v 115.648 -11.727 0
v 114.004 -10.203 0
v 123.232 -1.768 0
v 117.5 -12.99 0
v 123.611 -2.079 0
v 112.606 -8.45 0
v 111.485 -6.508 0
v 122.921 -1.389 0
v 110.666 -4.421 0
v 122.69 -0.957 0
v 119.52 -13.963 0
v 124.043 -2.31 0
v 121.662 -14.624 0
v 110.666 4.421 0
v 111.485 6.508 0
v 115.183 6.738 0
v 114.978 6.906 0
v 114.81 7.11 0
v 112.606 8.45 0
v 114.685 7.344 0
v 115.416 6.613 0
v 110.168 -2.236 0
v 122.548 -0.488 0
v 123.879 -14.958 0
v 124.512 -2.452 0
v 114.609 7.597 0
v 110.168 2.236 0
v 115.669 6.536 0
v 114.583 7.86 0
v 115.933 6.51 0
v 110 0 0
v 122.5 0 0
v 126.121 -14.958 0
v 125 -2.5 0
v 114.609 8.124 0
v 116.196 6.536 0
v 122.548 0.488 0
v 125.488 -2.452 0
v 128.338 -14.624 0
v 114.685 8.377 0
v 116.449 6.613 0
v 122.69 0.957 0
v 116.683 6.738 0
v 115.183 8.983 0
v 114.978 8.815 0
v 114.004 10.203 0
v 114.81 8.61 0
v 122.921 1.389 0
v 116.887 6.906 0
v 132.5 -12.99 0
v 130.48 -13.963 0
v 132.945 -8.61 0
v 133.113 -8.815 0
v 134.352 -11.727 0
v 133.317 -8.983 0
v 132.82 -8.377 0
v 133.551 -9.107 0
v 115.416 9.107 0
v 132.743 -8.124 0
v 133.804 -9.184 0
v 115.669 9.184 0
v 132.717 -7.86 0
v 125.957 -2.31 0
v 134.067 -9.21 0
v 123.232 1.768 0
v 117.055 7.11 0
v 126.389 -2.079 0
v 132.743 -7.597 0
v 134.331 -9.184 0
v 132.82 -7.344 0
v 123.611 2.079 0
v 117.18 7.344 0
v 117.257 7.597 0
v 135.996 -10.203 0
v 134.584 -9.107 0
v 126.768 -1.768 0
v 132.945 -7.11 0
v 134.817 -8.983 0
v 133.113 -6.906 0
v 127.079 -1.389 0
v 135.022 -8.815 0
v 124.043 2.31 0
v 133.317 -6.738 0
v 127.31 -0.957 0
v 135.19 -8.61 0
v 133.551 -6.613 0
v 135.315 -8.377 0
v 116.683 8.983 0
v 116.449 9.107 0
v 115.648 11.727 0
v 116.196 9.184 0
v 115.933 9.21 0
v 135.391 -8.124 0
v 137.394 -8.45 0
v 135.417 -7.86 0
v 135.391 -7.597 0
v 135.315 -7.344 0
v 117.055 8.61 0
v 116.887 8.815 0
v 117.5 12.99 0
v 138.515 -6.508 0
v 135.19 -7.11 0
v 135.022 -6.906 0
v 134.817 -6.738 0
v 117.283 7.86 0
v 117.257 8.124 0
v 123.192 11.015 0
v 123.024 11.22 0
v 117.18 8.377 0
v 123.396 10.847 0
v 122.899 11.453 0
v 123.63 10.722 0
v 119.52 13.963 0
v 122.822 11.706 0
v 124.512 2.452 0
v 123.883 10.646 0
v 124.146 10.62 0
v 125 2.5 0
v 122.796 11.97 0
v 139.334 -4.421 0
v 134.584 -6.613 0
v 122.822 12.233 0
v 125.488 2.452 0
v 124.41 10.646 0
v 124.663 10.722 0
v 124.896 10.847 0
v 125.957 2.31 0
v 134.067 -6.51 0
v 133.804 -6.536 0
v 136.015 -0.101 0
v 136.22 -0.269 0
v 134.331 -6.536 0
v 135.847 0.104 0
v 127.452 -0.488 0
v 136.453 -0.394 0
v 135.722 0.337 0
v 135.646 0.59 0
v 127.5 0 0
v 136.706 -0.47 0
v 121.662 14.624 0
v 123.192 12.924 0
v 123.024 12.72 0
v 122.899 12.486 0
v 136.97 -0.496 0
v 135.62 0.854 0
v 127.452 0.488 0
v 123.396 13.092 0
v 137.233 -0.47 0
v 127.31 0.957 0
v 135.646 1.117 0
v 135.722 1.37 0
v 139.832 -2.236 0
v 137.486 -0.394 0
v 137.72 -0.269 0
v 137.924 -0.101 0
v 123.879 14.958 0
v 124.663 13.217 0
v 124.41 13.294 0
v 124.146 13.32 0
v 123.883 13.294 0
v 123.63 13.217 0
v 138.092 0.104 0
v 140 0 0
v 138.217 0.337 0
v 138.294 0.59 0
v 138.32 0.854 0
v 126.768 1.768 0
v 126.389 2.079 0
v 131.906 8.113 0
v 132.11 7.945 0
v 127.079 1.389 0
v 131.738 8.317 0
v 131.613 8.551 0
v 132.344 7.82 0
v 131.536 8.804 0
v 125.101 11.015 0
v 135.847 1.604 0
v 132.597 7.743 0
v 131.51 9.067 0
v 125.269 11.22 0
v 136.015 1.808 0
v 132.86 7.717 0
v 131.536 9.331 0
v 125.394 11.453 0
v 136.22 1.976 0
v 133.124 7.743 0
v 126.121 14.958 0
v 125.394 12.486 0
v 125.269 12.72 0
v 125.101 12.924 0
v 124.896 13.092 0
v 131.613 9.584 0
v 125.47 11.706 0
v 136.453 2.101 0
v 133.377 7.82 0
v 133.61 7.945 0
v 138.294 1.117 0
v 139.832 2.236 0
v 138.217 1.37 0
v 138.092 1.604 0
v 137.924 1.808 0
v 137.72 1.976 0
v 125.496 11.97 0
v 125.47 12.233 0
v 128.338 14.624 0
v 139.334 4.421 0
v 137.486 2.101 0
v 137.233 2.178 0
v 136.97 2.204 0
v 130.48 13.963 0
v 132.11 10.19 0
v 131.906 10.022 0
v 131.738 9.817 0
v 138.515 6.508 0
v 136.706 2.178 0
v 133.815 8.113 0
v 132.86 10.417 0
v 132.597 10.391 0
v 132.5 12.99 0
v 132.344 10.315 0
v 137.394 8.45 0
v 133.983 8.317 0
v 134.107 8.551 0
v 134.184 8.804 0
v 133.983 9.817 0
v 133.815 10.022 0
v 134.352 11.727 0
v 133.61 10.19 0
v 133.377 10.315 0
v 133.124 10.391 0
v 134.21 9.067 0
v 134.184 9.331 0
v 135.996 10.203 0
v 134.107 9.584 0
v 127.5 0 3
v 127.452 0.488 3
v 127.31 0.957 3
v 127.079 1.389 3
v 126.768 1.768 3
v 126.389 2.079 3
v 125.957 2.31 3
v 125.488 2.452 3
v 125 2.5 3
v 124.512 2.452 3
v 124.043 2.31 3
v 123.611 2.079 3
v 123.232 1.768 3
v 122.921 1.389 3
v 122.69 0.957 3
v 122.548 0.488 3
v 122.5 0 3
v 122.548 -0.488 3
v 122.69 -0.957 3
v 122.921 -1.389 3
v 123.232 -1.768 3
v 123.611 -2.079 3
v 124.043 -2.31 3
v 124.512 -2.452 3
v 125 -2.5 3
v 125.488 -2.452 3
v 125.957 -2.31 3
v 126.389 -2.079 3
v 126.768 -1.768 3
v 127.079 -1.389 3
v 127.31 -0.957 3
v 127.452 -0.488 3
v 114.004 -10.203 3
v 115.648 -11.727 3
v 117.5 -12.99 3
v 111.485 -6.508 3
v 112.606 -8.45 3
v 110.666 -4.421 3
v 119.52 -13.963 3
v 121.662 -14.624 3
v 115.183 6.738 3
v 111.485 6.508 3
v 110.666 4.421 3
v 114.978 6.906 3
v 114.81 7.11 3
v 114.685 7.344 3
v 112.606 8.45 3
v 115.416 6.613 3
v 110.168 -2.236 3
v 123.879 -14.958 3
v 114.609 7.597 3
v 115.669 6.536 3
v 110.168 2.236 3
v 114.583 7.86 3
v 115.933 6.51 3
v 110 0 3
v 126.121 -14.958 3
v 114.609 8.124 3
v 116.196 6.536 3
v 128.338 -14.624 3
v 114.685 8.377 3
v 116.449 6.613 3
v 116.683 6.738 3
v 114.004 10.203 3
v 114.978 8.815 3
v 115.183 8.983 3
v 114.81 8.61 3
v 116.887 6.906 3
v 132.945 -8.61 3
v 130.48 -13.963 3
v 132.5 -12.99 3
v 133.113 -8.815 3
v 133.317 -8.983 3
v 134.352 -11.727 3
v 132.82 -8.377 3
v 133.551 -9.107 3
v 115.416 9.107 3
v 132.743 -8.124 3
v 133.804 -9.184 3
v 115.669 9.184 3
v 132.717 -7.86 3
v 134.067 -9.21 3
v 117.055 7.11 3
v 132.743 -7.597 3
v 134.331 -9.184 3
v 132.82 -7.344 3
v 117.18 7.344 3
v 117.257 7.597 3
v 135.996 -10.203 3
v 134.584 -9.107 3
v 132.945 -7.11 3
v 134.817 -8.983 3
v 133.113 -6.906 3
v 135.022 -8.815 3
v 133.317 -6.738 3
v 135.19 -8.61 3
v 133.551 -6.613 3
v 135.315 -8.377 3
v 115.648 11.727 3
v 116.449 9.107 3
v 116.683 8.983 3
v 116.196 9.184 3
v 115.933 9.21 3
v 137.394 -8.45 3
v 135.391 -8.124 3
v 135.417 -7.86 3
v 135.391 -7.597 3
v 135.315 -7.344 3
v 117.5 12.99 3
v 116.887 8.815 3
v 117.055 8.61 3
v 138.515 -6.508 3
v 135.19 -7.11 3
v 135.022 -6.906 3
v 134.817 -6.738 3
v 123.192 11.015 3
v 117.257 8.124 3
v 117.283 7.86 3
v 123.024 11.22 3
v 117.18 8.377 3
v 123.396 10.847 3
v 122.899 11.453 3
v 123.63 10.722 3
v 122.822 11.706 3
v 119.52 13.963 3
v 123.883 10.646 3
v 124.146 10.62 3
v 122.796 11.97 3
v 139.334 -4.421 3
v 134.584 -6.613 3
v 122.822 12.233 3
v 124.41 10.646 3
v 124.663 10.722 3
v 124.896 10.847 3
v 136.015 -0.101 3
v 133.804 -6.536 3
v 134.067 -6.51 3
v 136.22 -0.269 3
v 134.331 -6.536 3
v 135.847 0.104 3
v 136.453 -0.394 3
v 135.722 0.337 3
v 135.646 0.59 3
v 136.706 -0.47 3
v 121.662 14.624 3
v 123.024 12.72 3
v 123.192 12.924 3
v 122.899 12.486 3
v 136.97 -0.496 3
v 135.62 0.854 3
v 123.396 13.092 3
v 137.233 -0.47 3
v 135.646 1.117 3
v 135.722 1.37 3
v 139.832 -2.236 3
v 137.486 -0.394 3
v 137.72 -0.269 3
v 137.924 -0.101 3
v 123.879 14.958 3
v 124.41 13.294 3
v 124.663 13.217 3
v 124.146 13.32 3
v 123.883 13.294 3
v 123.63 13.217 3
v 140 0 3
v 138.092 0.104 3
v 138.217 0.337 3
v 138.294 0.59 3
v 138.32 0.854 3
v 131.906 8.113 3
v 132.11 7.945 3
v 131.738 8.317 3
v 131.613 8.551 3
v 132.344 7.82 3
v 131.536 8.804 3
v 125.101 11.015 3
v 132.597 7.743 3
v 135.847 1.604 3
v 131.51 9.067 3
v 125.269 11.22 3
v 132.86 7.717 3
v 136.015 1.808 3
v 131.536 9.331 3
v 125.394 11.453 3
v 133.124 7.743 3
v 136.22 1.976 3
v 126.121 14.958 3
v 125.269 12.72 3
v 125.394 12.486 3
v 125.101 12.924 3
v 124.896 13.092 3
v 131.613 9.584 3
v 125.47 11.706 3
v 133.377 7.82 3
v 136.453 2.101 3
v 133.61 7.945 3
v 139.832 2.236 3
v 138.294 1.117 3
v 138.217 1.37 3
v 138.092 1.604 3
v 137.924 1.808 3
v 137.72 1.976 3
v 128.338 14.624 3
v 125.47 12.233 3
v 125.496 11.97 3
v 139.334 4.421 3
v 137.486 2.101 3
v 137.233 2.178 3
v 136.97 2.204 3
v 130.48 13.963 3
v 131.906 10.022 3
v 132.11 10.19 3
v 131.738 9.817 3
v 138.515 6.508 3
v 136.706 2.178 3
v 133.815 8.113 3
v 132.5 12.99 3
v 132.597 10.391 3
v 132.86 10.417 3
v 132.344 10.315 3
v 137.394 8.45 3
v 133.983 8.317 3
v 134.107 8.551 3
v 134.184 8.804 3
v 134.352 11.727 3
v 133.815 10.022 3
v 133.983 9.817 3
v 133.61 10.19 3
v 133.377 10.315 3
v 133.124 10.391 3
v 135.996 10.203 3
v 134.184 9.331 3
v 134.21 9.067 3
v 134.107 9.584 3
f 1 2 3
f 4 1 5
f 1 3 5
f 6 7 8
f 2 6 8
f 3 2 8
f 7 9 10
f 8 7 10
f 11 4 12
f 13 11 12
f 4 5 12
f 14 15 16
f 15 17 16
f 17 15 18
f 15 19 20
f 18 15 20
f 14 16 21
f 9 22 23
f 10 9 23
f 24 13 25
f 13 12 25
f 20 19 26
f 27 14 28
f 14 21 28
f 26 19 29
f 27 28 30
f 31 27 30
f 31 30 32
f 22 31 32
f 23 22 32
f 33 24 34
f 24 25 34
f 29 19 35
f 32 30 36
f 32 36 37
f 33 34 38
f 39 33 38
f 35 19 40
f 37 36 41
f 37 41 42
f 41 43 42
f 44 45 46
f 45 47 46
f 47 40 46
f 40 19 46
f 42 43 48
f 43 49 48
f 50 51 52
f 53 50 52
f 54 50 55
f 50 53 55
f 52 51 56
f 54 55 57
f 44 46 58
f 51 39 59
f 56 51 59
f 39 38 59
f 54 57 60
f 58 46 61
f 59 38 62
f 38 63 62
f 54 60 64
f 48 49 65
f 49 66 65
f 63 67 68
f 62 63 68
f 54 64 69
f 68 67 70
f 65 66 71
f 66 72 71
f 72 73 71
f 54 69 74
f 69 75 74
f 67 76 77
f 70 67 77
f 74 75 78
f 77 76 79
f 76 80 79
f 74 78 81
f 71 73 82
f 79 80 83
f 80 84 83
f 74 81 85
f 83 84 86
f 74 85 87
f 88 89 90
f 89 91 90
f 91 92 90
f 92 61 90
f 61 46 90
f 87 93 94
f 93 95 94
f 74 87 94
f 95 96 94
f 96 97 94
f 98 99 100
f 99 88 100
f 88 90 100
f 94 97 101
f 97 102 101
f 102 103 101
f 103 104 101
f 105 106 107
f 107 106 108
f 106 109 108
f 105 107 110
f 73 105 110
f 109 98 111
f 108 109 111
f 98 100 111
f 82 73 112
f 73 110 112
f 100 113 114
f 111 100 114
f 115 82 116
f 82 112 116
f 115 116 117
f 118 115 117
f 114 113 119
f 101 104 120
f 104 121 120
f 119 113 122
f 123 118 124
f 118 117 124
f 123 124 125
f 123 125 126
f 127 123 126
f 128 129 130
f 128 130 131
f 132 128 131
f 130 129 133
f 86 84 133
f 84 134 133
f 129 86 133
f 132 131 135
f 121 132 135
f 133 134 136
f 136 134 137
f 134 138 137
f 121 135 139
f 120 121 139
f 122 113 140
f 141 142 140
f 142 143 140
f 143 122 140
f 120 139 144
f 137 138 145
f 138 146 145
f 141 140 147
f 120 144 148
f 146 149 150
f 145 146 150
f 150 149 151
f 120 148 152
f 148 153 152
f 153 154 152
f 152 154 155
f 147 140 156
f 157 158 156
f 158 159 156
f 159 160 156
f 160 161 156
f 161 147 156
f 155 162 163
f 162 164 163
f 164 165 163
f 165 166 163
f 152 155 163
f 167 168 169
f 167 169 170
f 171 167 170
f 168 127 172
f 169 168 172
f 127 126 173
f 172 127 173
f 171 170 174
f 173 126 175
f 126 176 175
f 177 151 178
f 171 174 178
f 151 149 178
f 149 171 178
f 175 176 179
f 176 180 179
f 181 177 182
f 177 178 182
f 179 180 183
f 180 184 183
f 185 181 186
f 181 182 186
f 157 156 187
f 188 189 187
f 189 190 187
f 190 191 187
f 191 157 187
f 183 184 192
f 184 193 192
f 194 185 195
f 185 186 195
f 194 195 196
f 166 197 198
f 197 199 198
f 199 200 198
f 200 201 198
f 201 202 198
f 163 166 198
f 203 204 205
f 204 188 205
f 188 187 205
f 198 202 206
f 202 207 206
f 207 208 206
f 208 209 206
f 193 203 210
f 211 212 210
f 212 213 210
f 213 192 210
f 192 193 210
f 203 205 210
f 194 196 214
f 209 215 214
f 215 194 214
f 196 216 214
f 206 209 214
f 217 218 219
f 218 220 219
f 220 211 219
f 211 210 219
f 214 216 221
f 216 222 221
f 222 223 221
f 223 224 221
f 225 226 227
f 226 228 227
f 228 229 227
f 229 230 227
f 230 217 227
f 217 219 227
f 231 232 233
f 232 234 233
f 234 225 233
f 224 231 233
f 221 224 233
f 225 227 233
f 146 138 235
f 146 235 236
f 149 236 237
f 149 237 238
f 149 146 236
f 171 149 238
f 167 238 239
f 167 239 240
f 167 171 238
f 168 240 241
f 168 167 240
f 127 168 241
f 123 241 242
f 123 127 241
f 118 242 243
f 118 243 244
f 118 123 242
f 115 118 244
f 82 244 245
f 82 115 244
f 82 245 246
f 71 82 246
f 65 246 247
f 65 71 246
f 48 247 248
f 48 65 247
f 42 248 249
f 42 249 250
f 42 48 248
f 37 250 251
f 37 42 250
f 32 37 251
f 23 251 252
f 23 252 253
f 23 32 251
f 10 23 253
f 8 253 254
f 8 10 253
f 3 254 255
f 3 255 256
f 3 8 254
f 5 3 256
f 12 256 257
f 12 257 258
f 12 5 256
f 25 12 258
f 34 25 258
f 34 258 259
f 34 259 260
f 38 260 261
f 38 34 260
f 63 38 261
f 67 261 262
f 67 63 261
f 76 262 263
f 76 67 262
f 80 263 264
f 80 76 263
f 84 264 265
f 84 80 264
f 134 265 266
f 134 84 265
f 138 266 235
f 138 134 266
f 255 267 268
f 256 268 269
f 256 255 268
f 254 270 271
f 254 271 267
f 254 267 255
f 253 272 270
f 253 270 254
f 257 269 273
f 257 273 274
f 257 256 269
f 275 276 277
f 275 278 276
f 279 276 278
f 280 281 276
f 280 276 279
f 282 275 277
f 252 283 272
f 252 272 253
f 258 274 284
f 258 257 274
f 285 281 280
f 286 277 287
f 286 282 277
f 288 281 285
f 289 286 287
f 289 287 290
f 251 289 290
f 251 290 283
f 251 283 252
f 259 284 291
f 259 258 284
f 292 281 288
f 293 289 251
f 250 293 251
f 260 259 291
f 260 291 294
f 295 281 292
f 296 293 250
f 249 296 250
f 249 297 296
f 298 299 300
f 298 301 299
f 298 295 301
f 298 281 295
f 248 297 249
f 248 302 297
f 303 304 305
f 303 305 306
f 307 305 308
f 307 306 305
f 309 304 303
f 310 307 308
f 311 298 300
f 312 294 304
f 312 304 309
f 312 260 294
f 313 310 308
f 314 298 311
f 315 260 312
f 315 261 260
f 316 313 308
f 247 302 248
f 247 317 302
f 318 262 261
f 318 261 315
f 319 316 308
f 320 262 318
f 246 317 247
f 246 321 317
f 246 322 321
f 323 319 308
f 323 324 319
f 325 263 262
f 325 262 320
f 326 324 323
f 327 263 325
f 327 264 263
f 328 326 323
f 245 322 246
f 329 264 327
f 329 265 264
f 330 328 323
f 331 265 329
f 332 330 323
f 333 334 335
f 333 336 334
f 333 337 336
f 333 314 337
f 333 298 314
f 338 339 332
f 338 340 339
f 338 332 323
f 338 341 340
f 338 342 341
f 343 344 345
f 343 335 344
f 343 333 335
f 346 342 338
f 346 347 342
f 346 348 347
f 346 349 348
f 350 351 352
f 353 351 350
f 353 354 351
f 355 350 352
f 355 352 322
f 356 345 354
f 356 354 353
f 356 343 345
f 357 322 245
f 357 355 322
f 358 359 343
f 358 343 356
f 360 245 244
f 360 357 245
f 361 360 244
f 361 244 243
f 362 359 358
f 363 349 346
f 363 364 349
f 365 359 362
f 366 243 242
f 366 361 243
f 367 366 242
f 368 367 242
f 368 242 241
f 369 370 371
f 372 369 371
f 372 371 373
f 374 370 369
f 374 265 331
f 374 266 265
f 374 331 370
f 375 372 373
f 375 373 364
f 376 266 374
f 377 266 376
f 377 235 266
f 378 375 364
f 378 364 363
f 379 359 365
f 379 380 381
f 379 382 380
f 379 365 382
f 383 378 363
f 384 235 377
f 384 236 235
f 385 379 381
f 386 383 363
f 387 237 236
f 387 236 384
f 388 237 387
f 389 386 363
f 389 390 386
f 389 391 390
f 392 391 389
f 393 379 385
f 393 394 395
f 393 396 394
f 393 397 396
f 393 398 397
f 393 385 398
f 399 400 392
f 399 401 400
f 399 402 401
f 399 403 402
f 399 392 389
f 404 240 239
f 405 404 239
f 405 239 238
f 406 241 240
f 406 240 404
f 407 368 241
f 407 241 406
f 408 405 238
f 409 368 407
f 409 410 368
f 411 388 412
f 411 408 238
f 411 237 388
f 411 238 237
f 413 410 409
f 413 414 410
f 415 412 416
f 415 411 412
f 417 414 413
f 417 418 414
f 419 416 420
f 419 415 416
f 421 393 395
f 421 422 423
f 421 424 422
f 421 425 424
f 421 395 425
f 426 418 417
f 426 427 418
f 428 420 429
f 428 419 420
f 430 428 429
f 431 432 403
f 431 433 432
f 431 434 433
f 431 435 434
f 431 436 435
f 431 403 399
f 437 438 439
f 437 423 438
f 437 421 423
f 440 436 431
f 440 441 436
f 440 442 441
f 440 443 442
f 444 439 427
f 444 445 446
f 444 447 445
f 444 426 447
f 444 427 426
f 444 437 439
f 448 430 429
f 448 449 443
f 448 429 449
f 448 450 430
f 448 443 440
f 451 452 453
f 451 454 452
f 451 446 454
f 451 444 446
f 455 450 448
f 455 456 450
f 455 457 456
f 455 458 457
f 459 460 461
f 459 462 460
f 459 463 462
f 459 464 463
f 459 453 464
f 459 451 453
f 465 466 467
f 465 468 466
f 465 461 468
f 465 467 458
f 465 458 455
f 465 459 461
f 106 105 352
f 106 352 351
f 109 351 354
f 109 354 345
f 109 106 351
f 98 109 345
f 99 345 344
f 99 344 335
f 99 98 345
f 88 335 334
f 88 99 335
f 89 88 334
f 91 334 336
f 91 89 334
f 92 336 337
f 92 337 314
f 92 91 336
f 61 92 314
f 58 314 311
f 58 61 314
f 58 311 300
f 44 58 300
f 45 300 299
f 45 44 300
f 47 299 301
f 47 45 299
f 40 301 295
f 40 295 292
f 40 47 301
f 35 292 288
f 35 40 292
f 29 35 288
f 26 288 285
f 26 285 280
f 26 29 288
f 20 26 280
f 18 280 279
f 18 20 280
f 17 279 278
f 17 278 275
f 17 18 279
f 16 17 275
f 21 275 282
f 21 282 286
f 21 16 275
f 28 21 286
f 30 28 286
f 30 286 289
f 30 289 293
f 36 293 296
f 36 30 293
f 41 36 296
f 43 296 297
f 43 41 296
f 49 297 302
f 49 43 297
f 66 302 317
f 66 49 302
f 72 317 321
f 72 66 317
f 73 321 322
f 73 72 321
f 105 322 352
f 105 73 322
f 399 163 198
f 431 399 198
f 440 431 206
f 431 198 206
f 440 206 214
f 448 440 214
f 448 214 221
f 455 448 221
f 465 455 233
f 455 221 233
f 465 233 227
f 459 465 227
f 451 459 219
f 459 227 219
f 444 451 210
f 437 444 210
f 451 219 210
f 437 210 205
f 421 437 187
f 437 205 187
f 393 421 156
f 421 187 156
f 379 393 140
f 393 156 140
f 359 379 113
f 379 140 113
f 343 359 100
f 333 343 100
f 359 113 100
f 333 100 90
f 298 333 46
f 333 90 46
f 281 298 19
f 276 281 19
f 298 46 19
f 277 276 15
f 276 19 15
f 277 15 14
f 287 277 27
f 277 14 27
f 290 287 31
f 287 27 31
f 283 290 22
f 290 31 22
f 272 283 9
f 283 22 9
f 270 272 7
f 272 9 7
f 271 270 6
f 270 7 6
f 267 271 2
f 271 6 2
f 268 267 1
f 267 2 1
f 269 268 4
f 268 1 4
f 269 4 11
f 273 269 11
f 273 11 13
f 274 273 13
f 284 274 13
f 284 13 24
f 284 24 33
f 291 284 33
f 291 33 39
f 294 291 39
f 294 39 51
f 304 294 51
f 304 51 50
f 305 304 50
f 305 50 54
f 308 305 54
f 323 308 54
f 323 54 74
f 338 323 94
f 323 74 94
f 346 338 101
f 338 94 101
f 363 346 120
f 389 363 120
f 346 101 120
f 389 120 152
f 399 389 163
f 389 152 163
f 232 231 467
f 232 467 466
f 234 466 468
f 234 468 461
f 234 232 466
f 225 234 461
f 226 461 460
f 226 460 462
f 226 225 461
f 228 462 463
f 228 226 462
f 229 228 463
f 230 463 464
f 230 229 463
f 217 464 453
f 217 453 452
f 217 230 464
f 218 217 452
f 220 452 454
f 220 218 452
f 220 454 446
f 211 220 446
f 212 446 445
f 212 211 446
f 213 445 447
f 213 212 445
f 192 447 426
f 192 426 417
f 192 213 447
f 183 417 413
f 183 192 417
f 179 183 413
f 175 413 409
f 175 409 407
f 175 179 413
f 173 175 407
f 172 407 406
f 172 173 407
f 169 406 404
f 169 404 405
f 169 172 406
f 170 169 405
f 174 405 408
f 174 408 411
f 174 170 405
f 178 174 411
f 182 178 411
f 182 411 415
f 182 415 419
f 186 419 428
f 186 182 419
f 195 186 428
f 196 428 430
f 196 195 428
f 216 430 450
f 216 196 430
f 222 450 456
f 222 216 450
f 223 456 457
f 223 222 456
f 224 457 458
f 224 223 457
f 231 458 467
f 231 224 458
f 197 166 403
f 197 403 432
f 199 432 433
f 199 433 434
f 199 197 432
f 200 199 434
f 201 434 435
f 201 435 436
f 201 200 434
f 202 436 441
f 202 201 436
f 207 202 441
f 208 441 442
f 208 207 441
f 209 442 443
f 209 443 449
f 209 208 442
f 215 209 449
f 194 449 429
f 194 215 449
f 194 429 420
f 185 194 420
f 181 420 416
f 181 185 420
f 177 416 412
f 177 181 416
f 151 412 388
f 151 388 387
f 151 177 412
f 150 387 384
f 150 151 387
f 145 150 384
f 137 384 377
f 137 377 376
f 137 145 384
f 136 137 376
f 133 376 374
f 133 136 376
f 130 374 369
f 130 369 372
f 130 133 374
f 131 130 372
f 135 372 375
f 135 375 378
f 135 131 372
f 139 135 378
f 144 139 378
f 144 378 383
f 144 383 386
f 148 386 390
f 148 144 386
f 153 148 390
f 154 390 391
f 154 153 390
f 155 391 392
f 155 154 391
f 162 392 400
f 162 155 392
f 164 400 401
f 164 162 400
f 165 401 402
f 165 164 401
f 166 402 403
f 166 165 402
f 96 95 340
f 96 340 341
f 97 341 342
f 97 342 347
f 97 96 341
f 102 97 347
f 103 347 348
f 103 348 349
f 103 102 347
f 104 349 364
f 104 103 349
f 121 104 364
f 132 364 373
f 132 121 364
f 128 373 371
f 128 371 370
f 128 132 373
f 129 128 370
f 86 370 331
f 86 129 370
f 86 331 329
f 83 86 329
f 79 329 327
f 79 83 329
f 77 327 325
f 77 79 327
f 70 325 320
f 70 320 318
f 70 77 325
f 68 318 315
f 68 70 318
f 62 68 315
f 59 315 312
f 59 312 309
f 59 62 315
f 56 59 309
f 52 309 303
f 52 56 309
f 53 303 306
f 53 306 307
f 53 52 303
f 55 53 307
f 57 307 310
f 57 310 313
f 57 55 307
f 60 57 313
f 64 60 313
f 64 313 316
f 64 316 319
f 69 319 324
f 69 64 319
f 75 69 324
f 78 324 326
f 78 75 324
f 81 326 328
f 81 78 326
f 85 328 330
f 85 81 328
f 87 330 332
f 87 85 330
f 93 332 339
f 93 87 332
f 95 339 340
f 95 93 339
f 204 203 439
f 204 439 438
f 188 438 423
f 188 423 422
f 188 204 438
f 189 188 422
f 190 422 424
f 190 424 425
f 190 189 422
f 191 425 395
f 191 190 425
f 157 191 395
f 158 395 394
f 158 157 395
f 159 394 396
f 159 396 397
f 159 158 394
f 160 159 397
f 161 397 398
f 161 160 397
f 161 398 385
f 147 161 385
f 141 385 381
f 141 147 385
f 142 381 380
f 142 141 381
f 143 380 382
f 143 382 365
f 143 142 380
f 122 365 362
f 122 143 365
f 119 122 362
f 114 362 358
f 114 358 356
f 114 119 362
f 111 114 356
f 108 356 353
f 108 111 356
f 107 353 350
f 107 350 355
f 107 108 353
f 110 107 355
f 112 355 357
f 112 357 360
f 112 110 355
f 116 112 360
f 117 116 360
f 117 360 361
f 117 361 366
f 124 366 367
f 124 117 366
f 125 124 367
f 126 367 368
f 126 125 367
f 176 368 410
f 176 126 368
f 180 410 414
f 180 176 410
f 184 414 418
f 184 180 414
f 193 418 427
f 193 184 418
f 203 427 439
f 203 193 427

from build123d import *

# Parameters (mm, degrees)
SKETCH_1_R      = 15
SKETCH_1_R_2    = 1.35
SKETCH_1_R_3    = 2.5
EXTRUDE_1_DEPTH = 3


with BuildPart() as part:
    # 草图1 → 凸台-拉伸1 (new body)
    with BuildSketch(Plane.XY):
        with Locations((125, 0)):
            Circle(SKETCH_1_R)
        with Locations((132.860147625, 9.067418558)):
            Circle(SKETCH_1_R_2, mode=Mode.SUBTRACT)
        with Locations((136.969596837, 0.853669463)):
            Circle(SKETCH_1_R_2, mode=Mode.SUBTRACT)
        with Locations((134.067418558, -7.860147625)):
            Circle(SKETCH_1_R_2, mode=Mode.SUBTRACT)
        with Locations((124.146330537, 11.969596837)):
            Circle(SKETCH_1_R_2, mode=Mode.SUBTRACT)
        with Locations((115.932581442, 7.860147625)):
            Circle(SKETCH_1_R_2, mode=Mode.SUBTRACT)
        with Locations((125, 0)):
            Circle(SKETCH_1_R_3, mode=Mode.SUBTRACT)
    extrude(amount=EXTRUDE_1_DEPTH)


solid = part.part
